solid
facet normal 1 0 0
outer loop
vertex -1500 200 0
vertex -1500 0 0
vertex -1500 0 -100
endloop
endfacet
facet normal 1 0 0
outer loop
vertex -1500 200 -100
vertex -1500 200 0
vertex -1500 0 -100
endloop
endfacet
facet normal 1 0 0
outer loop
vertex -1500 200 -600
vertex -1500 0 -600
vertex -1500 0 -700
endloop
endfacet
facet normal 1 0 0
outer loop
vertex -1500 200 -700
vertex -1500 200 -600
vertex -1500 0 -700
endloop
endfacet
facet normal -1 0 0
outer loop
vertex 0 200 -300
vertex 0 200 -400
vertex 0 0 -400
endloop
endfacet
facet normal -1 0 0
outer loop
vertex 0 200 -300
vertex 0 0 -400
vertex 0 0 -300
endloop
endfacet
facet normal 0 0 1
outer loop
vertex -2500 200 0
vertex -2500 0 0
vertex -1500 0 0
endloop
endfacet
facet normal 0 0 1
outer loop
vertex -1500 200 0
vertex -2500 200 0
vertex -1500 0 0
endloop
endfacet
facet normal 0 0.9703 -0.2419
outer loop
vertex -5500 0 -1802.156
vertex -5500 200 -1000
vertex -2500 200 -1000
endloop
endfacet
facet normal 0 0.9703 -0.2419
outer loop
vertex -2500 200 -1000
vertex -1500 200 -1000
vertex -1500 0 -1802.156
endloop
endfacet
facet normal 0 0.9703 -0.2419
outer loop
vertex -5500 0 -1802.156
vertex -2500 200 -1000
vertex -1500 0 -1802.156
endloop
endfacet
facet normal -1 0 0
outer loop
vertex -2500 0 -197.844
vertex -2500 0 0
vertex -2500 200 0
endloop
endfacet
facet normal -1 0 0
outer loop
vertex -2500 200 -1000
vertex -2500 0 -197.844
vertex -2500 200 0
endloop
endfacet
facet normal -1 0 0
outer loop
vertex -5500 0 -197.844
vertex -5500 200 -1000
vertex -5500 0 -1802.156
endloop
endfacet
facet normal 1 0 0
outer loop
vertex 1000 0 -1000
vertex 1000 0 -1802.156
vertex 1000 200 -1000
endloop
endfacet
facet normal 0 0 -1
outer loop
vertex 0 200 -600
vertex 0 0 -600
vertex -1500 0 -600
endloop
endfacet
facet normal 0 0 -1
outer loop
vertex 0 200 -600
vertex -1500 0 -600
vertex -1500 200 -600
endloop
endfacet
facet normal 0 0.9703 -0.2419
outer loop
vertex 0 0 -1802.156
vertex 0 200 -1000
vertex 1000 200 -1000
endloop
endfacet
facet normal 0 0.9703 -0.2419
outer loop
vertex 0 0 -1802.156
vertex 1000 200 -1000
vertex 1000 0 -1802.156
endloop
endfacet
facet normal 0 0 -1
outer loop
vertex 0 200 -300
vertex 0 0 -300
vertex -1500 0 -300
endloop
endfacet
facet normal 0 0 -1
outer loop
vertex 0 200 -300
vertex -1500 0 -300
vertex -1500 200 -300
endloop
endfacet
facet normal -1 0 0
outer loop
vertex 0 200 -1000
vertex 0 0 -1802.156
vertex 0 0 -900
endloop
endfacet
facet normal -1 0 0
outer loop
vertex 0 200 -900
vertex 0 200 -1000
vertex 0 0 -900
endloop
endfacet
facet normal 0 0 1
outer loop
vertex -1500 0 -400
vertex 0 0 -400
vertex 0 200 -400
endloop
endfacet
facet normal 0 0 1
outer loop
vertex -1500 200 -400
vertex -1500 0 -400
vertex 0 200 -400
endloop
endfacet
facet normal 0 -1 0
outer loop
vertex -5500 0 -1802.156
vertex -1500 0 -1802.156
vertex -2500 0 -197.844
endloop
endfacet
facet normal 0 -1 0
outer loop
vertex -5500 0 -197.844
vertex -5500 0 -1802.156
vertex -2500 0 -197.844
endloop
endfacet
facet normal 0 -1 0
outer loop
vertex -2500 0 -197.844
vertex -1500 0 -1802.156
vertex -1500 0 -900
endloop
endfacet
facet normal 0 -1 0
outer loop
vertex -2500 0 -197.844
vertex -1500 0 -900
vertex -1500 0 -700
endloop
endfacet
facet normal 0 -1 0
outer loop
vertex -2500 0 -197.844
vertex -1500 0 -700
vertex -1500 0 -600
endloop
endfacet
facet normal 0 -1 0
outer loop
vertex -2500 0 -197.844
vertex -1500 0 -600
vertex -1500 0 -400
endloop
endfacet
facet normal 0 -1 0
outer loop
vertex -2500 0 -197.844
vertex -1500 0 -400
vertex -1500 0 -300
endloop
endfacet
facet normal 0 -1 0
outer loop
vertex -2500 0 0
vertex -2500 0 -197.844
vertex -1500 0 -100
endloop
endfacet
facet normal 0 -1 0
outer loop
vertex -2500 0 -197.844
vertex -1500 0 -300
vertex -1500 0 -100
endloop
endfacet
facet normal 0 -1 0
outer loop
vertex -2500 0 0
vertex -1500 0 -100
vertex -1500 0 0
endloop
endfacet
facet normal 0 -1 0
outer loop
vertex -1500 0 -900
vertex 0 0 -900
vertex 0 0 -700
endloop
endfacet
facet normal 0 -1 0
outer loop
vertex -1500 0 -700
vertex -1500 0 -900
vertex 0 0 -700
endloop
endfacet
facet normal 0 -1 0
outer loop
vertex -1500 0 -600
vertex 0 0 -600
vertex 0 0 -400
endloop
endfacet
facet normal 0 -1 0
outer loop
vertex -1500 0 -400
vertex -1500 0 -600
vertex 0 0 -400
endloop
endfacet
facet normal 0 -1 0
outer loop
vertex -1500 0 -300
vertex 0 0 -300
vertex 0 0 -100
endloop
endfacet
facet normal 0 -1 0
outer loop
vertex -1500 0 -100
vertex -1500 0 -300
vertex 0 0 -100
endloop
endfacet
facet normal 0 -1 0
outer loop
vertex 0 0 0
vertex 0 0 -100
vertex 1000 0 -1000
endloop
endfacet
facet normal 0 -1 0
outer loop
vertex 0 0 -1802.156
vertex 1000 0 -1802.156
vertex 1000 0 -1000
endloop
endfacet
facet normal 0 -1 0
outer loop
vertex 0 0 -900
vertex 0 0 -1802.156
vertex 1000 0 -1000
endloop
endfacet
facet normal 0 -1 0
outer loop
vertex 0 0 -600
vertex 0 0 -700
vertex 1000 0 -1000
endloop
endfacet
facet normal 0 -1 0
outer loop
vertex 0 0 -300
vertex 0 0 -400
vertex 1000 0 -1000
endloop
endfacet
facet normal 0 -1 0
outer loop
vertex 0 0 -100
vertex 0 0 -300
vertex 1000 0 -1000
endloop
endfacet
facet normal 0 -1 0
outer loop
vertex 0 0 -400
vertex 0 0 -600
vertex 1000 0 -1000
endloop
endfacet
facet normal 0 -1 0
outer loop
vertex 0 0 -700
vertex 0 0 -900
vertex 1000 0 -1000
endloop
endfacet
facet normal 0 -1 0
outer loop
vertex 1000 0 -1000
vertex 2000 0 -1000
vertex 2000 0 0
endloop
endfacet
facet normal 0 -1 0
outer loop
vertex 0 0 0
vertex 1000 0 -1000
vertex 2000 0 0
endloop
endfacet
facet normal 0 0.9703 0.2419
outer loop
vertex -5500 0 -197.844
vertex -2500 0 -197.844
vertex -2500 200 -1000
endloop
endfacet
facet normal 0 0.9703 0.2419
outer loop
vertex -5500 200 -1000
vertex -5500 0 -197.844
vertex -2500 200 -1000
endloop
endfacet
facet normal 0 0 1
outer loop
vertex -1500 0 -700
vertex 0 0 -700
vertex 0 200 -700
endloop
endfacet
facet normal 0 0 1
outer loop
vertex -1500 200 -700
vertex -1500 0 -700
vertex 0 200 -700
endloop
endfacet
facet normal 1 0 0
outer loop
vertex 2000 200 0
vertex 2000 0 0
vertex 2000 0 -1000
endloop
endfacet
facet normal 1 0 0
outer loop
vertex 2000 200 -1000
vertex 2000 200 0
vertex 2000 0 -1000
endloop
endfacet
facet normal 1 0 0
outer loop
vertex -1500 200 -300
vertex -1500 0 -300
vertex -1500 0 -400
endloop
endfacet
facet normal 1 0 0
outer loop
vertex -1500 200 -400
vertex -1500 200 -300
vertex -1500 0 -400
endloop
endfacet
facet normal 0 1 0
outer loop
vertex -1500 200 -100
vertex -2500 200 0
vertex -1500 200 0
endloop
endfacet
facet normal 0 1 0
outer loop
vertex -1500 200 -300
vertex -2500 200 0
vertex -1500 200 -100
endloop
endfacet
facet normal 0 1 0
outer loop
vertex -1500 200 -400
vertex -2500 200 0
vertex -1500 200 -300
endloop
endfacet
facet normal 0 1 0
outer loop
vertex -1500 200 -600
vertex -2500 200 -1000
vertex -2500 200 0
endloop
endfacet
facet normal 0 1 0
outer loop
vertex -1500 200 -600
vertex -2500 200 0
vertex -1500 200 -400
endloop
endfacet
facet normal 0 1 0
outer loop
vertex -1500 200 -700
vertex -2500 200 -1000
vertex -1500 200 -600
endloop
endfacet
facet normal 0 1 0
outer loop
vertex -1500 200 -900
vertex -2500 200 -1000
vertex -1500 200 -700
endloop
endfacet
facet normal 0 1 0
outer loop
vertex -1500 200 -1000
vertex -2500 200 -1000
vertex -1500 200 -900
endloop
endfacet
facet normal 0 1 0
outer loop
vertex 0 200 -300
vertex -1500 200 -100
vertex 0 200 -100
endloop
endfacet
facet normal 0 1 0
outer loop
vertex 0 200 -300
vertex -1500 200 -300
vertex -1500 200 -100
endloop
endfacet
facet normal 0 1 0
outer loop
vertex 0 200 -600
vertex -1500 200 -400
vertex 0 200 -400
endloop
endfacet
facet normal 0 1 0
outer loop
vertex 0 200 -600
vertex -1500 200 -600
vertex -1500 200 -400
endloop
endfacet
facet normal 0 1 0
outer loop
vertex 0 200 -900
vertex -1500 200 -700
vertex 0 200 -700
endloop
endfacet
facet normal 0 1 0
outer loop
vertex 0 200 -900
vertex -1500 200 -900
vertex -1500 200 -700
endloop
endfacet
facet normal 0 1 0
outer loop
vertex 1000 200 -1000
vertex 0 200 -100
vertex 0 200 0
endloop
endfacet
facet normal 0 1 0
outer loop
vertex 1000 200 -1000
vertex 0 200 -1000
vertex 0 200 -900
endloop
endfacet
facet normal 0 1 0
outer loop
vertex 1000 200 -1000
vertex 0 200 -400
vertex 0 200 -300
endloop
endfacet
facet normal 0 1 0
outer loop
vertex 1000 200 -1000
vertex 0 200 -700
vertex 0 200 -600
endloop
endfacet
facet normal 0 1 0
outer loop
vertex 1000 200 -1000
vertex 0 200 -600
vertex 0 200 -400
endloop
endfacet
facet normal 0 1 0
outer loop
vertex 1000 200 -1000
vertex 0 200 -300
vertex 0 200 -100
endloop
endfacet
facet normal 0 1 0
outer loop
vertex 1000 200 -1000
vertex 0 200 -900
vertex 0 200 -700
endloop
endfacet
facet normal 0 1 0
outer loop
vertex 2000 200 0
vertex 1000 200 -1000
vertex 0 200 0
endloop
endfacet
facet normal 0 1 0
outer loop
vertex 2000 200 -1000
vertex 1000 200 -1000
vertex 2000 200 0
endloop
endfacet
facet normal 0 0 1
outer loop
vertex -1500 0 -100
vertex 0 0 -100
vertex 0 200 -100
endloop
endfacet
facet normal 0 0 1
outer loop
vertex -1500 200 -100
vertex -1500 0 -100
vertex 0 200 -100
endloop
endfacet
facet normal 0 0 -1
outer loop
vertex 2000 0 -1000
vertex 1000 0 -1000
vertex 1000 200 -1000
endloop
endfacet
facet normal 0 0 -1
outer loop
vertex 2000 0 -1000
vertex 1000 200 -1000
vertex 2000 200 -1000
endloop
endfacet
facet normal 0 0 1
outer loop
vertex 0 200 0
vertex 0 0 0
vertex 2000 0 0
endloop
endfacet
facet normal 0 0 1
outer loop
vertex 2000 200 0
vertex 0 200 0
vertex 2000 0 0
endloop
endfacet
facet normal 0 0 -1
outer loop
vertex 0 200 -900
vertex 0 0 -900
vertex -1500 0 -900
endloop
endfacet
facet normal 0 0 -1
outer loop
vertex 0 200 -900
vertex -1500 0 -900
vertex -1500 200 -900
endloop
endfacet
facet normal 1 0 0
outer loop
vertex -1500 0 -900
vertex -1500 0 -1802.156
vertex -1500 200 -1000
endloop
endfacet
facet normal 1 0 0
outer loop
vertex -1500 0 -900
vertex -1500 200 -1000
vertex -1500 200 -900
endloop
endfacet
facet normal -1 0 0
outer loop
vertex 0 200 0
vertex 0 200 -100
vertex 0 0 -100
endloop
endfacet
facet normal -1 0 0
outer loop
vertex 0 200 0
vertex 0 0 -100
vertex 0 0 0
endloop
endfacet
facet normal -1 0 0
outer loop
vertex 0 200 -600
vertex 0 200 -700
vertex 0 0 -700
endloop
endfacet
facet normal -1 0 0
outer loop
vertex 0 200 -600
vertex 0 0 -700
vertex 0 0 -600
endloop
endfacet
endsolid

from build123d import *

# Parameters (mm, degrees)
SKETCH_1_W      = 2000
SKETCH_1_H      = 1000
EXTRUDE_1_DEPTH = 200
EXTRUDE_2_DEPTH = 1000
SKETCH_3_W      = 200
SKETCH_3_H      = 200
EXTRUDE_3_DEPTH = 1500
SKETCH_4_W      = 1000
SKETCH_4_H      = 1000
EXTRUDE_4_DEPTH = 200
EXTRUDE_5_DEPTH = 4000


with BuildPart() as part:
    # 草图1 → 凸台-拉伸1 (new body)
    with BuildSketch(Plane(origin=(0, 0, 0), x_dir=(1, 0, 0), z_dir=(0, 1, 0))):
        with Locations((1000, 500)):
            Rectangle(SKETCH_1_W, SKETCH_1_H)
    extrude(amount=EXTRUDE_1_DEPTH)

    # 草图2 → 凸台-拉伸2 (add)
    with BuildSketch(Plane.ZY):
        Polygon((-1000, 200), (-1802.156186707, 0), (-1000, 0), align=None)
    extrude(amount=-EXTRUDE_2_DEPTH)

    # 草图3 → 凸台-拉伸3 (add)
    with BuildSketch(Plane.ZY):
        with Locations((-200, 100)):
            Rectangle(SKETCH_3_W, SKETCH_3_H)
        with Locations((-500, 100)):
            Rectangle(SKETCH_3_W, SKETCH_3_H)
        with Locations((-800, 100)):
            Rectangle(SKETCH_3_W, SKETCH_3_H)
    extrude(amount=EXTRUDE_3_DEPTH)

    # 草图4 → 凸台-拉伸4 (add)
    with BuildSketch(Plane(origin=(0, 0, 0), x_dir=(1, 0, 0), z_dir=(0, 1, 0))):
        with Locations((-2000, 500)):
            Rectangle(SKETCH_4_W, SKETCH_4_H)
    extrude(amount=EXTRUDE_4_DEPTH)

    # 草图5 → 凸台-拉伸5 (add)
    with BuildSketch(Plane(origin=(-1500, 0, 0), x_dir=(0, 0, -1), z_dir=(1, 0, 0))):
        Polygon((1802.156186707, 0), (197.843813293, 0), (1000, 200), align=None)
    extrude(amount=-EXTRUDE_5_DEPTH)


solid = part.part
